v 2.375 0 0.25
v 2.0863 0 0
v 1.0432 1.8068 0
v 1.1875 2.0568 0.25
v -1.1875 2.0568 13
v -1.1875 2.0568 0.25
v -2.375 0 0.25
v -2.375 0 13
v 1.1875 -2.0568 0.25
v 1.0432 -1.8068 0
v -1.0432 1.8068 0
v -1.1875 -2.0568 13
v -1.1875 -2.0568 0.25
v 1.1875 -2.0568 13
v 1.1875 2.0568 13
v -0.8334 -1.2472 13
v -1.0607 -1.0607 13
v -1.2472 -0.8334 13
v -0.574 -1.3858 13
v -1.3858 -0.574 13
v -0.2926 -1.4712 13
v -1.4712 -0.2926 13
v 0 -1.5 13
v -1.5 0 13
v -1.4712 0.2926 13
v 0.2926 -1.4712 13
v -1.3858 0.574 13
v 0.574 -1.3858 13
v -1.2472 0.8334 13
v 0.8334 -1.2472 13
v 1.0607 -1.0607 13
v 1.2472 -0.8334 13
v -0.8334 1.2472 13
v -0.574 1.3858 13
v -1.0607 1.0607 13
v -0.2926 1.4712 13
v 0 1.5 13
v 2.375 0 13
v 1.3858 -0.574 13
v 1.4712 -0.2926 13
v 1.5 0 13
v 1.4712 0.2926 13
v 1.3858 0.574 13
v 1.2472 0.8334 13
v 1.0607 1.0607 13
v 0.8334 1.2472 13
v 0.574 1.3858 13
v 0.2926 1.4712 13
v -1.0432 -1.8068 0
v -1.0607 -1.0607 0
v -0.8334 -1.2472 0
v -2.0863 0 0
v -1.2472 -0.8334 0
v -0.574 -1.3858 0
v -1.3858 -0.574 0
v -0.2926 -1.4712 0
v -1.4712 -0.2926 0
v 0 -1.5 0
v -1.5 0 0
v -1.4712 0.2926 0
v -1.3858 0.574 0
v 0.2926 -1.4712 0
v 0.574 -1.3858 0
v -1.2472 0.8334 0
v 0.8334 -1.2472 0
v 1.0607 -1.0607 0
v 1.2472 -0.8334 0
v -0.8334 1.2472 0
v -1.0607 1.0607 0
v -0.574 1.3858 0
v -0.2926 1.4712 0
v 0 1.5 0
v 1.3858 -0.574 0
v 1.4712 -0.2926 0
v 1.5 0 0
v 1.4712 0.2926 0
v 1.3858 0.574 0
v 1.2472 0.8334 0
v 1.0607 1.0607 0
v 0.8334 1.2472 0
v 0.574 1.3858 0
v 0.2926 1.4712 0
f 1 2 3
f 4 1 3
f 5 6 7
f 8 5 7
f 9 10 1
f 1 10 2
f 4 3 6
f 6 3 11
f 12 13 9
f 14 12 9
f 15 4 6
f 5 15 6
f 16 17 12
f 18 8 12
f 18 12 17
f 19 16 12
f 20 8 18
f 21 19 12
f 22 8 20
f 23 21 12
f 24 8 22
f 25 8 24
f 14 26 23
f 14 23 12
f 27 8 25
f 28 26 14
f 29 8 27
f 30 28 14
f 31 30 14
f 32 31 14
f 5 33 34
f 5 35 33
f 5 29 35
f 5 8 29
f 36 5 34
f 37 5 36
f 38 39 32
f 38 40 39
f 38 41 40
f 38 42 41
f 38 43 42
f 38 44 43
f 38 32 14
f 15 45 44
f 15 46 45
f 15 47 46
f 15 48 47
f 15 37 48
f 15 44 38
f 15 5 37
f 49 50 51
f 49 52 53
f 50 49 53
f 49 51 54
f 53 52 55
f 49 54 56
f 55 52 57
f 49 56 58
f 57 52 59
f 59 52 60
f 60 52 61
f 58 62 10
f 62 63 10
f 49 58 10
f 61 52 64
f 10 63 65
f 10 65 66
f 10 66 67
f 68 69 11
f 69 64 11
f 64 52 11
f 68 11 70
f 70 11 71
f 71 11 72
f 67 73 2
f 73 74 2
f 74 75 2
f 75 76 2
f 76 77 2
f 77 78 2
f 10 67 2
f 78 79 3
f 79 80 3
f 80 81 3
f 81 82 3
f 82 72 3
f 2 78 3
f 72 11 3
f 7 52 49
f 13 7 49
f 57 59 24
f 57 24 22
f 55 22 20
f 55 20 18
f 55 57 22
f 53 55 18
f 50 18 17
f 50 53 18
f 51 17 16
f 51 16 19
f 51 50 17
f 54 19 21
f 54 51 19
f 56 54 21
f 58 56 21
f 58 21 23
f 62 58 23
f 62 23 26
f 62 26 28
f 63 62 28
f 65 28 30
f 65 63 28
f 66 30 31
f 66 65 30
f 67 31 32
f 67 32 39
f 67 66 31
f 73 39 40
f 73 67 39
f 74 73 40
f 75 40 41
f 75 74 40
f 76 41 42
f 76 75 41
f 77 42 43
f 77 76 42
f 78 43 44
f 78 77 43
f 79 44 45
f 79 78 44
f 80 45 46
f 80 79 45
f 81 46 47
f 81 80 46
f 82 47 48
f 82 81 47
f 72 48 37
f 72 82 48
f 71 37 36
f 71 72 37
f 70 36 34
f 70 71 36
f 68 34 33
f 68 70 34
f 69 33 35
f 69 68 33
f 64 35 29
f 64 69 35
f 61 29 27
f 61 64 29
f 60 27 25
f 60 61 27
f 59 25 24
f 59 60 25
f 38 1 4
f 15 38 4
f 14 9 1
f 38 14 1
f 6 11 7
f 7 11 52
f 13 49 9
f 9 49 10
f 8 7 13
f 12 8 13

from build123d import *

# Parameters (mm, degrees)
ESQUISSE1_R        = 1.5
BOSS_EXTRU_1_DEPTH = 13
CHANFREIN1_SIZE    = 0.25


with BuildPart() as part:
    # Esquisse1 → Boss.-Extru.1 (new body)
    with BuildSketch(Plane.XY):
        Polygon((-1.1875, -2.056810334), (1.1875, -2.056810334), (2.375, 0), (1.1875, 2.056810334), (-1.1875, 2.056810334), (-2.375, 0), align=None)
        with Locations(Location((0, 0, 0), (0, 0, 180))):
            Circle(ESQUISSE1_R, mode=Mode.SUBTRACT)
    extrude(amount=BOSS_EXTRU_1_DEPTH)

    # Chanfrein1
    chanfrein1_edges = [part.edges().sort_by_distance(p)[0] for p in [
        (-1.78125, 1.028405167, 0),
        (0, 2.056810334, 0),
        (1.78125, 1.028405167, 0),
        (1.78125, -1.028405167, 0),
        (0, -2.056810334, 0),
        (-1.78125, -1.028405167, 0),
    ]]
    chamfer(chanfrein1_edges, length=CHANFREIN1_SIZE)


solid = part.part
